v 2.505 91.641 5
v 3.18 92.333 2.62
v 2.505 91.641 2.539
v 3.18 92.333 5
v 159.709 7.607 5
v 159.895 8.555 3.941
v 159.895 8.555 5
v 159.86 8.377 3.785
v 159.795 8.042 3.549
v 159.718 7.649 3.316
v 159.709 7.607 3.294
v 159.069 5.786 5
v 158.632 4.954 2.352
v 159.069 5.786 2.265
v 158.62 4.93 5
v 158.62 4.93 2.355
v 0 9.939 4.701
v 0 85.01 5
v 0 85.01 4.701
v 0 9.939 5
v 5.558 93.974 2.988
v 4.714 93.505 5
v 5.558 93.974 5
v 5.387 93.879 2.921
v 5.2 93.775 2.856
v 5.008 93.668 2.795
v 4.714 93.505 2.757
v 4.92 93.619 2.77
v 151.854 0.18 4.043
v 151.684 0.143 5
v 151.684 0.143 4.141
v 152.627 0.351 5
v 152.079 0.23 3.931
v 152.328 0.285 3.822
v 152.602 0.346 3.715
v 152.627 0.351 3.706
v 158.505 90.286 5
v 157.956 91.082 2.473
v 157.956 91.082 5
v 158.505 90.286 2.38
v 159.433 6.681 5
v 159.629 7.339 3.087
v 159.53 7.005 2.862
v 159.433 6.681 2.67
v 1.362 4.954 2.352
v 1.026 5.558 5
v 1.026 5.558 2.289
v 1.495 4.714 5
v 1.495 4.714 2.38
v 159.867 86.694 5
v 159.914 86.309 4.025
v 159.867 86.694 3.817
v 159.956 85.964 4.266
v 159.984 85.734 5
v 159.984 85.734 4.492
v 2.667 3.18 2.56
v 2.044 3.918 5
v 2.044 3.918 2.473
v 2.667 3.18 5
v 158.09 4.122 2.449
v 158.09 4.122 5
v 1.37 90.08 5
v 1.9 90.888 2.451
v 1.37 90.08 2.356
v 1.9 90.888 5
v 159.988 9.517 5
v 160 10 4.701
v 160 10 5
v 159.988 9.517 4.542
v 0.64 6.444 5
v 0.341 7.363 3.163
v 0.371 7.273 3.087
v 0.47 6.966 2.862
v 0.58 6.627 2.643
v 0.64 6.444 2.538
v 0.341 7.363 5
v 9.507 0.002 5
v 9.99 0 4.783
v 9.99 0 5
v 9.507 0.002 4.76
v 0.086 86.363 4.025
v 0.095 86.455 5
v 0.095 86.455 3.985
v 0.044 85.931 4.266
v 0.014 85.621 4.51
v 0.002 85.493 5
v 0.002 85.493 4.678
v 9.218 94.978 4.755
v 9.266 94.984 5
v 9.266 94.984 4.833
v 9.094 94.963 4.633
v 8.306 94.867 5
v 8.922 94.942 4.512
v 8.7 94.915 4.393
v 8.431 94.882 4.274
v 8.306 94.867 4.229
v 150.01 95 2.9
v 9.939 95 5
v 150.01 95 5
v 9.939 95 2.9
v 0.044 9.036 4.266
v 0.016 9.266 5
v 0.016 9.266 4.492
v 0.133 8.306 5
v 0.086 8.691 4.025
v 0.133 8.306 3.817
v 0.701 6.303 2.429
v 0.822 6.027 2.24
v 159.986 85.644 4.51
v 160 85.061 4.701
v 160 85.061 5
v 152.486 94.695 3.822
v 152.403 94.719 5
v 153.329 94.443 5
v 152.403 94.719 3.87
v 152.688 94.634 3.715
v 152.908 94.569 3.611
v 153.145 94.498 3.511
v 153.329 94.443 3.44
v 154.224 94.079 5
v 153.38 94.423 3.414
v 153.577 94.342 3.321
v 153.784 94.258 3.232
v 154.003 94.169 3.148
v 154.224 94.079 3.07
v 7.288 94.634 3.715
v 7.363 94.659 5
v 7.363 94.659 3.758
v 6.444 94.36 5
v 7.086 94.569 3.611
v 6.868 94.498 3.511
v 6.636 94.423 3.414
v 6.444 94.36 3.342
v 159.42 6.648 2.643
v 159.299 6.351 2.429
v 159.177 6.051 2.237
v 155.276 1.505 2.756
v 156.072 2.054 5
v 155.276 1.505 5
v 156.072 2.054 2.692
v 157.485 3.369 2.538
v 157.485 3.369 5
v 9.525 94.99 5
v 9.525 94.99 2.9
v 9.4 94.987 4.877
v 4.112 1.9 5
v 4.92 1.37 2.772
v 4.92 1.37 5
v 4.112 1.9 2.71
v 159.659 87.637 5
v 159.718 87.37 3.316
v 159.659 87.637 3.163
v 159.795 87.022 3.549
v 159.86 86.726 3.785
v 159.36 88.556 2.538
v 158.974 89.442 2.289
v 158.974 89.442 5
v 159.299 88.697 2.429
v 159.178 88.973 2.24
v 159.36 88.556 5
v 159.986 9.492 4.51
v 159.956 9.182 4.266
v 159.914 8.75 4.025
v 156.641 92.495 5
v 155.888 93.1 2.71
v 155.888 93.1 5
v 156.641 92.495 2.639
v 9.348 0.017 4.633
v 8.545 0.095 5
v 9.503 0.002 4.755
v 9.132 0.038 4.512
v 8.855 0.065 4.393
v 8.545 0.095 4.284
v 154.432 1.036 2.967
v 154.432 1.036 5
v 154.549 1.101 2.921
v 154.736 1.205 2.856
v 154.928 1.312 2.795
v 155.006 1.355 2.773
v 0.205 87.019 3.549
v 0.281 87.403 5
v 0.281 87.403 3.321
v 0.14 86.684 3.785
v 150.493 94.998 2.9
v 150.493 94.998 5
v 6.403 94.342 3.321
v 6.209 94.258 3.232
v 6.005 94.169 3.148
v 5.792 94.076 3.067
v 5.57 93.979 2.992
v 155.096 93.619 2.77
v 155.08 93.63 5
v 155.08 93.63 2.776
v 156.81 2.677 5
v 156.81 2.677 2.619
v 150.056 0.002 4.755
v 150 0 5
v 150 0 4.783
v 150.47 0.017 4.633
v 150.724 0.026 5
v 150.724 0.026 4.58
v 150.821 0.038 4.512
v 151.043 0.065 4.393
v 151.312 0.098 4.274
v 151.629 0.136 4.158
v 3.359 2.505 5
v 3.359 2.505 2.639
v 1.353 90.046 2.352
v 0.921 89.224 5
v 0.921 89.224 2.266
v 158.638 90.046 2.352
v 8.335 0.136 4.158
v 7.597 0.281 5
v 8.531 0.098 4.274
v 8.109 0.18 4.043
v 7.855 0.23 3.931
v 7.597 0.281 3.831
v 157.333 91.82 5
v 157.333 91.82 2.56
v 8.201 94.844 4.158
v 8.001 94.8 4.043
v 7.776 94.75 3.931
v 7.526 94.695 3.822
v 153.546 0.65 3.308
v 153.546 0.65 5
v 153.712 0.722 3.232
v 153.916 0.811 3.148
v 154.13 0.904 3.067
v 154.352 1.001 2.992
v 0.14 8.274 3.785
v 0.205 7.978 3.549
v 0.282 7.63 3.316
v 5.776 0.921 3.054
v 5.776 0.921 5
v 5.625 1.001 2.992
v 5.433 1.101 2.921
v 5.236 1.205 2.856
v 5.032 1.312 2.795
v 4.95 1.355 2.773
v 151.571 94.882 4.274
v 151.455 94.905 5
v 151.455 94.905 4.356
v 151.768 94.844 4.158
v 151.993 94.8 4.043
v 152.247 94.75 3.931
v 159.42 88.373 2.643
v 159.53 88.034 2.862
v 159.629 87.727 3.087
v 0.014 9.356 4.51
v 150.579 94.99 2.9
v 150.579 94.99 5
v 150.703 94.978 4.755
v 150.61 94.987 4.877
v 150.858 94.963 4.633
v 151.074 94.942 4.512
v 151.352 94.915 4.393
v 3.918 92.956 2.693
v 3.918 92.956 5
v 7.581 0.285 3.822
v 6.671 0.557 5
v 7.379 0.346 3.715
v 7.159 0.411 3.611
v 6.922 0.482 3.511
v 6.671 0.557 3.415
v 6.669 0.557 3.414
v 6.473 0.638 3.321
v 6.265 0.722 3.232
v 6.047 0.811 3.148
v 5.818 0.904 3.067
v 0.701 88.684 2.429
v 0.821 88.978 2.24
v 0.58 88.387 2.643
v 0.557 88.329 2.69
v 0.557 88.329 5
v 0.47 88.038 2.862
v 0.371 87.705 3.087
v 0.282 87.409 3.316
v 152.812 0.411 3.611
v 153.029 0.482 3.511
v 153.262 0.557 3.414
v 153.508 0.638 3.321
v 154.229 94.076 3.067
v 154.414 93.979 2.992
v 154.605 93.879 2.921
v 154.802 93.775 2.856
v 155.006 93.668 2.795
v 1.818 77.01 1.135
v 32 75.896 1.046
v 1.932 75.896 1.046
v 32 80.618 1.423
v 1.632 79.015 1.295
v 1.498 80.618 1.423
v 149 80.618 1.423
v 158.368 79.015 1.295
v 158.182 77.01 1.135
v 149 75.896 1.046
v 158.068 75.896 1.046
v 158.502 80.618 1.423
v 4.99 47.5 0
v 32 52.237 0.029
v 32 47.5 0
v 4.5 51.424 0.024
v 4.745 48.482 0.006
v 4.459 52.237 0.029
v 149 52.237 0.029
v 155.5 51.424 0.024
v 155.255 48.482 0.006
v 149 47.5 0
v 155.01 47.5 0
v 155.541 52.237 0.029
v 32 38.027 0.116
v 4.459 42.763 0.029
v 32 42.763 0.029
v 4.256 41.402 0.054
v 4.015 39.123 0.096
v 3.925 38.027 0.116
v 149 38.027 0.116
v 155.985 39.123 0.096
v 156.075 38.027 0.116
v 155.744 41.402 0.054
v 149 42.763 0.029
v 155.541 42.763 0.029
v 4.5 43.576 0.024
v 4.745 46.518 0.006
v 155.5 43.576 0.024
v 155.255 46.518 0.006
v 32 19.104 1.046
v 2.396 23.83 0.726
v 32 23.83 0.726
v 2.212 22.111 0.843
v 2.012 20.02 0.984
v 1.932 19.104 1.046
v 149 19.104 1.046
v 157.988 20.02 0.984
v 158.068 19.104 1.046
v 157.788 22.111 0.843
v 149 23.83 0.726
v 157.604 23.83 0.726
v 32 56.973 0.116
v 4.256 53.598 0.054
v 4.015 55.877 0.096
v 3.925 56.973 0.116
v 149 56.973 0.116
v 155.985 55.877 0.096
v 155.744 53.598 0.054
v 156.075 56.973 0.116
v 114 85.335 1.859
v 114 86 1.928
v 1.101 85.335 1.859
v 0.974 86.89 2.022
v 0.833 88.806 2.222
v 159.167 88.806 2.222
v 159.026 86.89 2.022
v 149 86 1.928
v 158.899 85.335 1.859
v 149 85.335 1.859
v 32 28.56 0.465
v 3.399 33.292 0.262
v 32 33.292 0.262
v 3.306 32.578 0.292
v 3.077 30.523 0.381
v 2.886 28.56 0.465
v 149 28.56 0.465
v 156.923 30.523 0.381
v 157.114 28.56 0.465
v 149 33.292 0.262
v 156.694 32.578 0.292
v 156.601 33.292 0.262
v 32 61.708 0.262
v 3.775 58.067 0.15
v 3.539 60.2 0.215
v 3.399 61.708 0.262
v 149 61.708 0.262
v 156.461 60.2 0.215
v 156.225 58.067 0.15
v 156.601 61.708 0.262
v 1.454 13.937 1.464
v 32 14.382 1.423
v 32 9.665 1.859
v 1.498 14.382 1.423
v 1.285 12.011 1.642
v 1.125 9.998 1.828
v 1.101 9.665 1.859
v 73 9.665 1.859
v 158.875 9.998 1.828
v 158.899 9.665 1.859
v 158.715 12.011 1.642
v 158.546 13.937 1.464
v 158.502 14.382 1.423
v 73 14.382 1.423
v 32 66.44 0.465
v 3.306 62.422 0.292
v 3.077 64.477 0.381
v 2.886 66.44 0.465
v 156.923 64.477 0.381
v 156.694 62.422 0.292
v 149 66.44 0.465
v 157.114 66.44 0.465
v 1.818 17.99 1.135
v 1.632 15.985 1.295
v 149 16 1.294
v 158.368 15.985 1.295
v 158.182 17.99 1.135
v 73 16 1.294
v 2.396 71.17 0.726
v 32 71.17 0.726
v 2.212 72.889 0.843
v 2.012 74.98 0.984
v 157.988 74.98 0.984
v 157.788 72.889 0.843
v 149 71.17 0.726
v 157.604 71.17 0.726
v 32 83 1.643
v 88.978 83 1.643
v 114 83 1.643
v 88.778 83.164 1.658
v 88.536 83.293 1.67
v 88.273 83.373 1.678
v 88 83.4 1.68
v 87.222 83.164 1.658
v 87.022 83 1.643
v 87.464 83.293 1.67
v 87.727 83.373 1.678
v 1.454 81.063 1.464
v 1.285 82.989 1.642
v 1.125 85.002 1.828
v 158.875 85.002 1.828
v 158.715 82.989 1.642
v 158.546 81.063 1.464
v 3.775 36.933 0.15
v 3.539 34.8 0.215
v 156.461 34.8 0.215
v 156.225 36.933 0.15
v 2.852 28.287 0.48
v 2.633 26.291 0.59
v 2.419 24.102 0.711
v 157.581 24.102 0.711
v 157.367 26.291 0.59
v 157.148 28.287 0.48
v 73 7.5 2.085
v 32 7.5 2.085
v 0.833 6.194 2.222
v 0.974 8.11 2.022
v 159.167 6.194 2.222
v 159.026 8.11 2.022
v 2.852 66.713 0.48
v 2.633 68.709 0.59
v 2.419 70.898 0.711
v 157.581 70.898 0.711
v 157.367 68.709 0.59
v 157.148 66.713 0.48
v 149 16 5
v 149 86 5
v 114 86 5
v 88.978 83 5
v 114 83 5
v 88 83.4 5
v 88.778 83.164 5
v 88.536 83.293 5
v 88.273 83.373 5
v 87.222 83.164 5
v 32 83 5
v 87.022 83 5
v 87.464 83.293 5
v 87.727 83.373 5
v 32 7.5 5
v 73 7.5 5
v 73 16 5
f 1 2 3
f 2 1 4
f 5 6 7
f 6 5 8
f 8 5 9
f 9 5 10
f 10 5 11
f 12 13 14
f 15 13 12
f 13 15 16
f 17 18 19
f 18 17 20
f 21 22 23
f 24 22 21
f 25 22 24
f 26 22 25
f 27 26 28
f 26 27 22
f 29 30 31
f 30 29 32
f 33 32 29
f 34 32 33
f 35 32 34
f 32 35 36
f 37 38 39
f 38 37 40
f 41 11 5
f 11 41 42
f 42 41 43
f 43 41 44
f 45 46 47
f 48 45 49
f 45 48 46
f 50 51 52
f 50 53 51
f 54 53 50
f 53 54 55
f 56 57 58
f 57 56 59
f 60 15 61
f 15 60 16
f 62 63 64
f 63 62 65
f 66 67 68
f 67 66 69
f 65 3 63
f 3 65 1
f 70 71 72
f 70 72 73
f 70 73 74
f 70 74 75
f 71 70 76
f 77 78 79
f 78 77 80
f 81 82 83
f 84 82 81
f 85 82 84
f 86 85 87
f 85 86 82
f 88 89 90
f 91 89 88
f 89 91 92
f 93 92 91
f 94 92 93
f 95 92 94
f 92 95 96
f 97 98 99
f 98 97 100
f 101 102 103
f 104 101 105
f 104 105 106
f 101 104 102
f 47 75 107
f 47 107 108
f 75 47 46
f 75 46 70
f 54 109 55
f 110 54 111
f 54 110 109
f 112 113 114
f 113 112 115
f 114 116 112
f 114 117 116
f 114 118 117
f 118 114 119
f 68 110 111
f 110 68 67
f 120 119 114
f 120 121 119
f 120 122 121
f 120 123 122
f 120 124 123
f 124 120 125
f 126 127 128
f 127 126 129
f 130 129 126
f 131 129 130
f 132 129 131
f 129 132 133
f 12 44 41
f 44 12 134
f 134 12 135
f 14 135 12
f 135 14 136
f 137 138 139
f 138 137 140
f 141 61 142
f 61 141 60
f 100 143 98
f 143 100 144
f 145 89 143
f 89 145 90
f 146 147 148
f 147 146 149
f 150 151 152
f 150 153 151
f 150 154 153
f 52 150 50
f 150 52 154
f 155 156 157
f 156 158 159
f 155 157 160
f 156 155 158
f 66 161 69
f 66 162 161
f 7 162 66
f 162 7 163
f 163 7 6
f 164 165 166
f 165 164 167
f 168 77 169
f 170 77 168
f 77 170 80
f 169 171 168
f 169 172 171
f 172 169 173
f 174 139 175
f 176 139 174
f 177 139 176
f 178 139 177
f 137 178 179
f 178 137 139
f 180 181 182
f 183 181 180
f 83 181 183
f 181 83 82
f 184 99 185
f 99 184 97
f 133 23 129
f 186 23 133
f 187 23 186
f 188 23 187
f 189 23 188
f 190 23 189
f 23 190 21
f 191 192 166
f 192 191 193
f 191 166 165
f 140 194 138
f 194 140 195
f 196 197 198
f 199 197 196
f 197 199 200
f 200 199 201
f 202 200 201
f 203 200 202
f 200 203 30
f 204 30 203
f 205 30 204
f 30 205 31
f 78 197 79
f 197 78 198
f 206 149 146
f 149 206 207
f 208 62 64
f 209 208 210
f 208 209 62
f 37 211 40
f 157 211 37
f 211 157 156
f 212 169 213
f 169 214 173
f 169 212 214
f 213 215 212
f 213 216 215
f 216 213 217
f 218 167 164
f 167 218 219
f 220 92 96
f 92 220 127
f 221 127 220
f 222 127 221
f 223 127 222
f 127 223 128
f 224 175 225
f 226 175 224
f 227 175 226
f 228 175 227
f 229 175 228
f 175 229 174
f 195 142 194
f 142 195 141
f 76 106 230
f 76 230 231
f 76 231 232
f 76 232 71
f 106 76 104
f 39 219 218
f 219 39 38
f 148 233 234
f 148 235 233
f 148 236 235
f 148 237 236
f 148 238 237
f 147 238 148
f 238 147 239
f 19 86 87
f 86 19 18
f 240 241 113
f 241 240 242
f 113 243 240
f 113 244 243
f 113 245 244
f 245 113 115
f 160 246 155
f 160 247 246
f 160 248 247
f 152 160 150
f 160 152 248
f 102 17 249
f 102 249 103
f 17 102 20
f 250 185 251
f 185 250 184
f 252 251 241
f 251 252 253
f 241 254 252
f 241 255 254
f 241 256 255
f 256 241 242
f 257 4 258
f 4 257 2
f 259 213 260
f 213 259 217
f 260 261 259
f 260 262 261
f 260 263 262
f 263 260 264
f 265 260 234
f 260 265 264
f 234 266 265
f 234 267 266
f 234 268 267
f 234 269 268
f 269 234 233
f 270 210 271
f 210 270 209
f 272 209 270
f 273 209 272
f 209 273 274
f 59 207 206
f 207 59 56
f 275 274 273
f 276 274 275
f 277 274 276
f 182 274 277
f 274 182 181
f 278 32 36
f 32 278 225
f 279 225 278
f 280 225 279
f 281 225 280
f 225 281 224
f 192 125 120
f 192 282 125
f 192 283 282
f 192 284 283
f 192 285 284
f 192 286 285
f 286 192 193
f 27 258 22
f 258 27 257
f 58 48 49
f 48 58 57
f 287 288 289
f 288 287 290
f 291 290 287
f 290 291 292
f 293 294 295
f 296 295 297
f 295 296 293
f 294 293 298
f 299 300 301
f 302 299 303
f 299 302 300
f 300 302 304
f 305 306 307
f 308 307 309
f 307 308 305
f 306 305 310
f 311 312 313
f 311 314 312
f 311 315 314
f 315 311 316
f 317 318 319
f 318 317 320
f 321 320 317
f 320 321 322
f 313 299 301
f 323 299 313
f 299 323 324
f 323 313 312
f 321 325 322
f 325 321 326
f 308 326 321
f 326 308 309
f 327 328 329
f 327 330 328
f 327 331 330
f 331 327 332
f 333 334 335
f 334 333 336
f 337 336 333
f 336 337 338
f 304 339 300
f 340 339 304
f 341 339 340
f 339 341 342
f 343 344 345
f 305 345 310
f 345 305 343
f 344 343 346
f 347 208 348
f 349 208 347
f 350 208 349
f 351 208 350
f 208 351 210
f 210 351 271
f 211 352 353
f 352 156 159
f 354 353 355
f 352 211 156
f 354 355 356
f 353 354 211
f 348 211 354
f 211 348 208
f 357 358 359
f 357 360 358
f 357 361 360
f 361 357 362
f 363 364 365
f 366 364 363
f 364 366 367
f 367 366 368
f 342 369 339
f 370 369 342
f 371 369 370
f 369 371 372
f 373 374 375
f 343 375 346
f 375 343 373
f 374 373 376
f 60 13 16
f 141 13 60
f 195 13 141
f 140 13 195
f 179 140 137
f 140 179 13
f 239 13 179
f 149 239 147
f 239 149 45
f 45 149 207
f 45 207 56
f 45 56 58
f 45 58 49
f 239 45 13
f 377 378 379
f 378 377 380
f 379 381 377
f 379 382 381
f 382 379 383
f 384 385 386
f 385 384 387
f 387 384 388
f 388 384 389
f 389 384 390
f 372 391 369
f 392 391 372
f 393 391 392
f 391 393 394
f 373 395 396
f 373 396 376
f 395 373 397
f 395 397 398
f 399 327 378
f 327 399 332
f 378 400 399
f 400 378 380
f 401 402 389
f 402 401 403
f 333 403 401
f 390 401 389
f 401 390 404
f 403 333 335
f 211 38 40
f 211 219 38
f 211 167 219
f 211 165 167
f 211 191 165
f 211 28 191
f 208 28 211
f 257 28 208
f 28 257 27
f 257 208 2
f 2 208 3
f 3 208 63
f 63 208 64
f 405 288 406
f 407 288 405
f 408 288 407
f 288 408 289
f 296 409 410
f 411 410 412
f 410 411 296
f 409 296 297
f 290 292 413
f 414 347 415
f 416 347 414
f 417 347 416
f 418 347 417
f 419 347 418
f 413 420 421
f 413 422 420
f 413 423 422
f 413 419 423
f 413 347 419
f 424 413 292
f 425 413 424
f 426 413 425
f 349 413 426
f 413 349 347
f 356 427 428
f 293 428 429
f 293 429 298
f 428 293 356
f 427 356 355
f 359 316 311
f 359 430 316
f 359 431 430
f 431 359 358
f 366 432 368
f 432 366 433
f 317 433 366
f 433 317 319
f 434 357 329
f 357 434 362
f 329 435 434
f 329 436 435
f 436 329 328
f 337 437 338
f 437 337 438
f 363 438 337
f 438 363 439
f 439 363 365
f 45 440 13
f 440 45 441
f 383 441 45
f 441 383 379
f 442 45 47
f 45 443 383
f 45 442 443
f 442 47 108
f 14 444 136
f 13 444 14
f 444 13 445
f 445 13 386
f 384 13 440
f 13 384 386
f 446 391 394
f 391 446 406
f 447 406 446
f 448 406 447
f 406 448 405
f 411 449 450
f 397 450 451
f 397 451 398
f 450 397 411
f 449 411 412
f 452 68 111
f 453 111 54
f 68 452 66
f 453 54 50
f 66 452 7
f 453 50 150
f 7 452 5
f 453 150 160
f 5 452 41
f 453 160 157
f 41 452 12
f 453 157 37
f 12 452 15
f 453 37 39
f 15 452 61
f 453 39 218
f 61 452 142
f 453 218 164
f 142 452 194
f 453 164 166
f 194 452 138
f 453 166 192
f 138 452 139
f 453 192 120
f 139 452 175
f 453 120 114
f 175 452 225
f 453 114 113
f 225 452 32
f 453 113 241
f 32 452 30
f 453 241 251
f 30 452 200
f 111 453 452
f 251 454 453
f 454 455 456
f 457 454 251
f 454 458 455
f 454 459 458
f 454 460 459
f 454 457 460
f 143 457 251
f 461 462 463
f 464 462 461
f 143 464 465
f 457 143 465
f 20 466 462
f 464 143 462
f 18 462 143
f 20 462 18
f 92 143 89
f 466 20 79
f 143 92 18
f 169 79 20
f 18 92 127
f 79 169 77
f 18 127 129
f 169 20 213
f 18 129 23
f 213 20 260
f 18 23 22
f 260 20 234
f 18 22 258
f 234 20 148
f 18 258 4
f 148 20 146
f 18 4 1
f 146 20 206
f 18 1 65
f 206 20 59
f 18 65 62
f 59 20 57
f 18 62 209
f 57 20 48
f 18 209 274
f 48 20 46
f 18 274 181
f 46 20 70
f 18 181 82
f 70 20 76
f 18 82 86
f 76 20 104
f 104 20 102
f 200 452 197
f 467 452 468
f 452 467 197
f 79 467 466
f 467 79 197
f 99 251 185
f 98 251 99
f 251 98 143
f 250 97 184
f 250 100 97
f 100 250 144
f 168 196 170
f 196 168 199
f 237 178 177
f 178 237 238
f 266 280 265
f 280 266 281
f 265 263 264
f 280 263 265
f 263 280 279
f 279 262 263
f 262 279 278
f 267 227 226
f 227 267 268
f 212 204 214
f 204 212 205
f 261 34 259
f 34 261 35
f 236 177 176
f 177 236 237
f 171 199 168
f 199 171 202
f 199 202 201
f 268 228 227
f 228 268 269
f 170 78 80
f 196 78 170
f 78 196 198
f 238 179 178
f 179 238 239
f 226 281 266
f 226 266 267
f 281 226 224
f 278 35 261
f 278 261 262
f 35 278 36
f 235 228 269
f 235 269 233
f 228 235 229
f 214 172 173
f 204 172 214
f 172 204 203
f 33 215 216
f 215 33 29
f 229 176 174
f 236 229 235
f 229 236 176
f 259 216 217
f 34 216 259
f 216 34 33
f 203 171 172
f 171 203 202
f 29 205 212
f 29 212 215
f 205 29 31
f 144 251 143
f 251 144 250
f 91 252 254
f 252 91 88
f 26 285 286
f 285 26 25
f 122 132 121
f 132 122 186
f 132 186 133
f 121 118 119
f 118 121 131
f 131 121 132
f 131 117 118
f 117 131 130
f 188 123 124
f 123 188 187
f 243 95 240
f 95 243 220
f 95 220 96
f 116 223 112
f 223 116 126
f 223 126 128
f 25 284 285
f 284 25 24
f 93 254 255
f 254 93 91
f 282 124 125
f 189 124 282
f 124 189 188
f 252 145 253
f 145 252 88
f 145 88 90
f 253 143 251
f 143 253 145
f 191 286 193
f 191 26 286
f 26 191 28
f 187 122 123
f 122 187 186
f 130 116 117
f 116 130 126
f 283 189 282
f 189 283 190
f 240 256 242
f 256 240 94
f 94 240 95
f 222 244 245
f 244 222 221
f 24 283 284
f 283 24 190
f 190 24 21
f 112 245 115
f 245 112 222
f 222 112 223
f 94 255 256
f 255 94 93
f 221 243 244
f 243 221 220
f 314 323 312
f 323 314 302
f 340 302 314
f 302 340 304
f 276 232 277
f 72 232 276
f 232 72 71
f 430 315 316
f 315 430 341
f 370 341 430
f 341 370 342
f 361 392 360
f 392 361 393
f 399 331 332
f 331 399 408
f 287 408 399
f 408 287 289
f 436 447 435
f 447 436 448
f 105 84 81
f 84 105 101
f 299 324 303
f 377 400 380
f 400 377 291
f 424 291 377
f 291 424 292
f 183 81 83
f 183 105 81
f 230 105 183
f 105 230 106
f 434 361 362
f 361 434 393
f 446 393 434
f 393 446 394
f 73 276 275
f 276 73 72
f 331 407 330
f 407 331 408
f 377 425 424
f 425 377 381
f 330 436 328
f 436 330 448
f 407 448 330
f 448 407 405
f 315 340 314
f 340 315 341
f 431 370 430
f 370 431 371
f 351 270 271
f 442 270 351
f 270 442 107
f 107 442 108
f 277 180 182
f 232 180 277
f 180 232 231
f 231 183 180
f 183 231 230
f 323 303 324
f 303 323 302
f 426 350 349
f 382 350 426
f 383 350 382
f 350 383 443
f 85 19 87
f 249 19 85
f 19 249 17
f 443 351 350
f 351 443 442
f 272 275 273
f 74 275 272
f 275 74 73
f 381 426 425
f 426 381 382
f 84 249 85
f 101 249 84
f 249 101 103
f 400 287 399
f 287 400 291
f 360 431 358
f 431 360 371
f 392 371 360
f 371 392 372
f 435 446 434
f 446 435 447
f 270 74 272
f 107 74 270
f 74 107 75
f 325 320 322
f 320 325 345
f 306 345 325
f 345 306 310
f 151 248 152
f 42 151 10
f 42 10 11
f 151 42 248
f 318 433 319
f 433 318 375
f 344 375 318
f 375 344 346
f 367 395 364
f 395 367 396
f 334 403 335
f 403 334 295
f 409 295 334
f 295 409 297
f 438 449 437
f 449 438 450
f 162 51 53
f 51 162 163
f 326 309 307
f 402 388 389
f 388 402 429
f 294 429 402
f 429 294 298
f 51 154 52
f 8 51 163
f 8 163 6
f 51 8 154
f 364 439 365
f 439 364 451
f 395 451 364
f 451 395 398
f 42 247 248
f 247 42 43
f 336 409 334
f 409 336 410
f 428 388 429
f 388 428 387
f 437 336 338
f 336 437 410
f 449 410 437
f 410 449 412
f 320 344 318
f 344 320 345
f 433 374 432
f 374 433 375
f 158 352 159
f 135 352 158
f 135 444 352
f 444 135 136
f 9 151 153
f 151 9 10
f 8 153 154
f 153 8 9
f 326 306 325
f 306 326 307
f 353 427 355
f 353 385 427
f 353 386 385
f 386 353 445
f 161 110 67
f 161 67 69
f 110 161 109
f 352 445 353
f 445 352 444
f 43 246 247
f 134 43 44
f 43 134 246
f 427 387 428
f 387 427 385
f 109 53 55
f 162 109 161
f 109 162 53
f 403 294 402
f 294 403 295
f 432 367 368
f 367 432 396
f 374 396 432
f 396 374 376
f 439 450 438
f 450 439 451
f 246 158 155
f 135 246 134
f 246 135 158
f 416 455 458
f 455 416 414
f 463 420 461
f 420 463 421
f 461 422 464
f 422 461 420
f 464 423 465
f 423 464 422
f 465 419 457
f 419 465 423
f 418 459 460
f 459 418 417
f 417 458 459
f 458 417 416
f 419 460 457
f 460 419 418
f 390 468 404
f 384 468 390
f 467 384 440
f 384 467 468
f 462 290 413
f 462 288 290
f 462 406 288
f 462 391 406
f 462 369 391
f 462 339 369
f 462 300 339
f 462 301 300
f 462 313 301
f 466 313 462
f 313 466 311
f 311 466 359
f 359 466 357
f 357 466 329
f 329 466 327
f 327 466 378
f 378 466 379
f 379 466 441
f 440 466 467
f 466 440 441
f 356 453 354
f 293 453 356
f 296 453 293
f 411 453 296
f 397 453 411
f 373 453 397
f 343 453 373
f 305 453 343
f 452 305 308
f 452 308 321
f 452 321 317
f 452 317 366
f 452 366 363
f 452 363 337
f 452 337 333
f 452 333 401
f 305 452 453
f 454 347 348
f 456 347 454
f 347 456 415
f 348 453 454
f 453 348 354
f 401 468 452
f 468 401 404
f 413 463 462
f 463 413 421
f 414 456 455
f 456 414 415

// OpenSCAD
controllerHolder();

module controllerHolder() {

    width = 160; // +2
    depth = 95;  // -1
    height = 2;
    curvature_height = 3;
    radius_t = 10;
    radius_b = 10;
    
    draw_pcb = true;
    
    pcb_offset = [55, 17, 5];
    
    translate(pcb_offset) {
        if (draw_pcb) {
        color([0.7, 0.7, 0.7]) translate([0, 0, 3]) import(file = "controller4.dxf");
        }
    }

    difference() {
        translate([width, 0, height+curvature_height]) rotate([0, 180, 0]) baseplate(5, 10);
        
        translate(pcb_offset) {
            translate([0,   53.3, -10]) pug();
            translate([33,  65,   -10]) pug();
            translate([33,  10,   -10]) pug();
            translate([66,  3.5,  -10]) pug();
            translate([89,  3.5,  -10]) pug();
            translate([66,  61.5, -10]) pug();
            translate([89,  61.5, -10]) pug();
        }
        
        // viewfinder cutout
        translate([32, 7.5, -1]) cube([41, 25, 10]);
    
        // pi cutout
        translate([114, 16, -1]) cube([35, 70, 10]); 
        
        // board cutout
        translate([72, 16, -1]) cube([43, 67, 10]); 
        translate([32, 32, -1]) cube([41, 51, 10]); 
   
    }
    
                    

    // modules                
    
    module baseplate(rounding_diameter, rounding_diameter2) {       
        difference() {
            union() {
                xy_off = 0;
                
                intersection() {
                    diameter = 772;
                    offset = -diameter/2 + height + curvature_height;
                      
                    
                    translate([xy_off/2, xy_off/2, height]) 
                        block([width-0, depth-0, 0.1], [width-xy_off, depth-xy_off, 0.1], curvature_height);
                    
                    translate([0, depth/2, offset]) rotate([0, 90, 0]) {
                        cylinder(h=width, d=diameter, $fn=512);
                    }
                }   
                
               
                
                block([width-xy_off, depth-xy_off, 0.1], [width, depth, 0.1], height);
            }
        
            translate([-0.01, -0.01, 0]) difference() {
                cube([width+0.02, rounding_diameter/2, rounding_diameter/2]);
                translate([0, rounding_diameter/2, 0]) rotate([0, 90, 0]) cylinder(h=width, d=rounding_diameter, $fn=128);
            }
            translate([width-0.01, depth-0.01, 0]) rotate([180, 180, 0]) difference() {
                cube([width+0.02, rounding_diameter/2, rounding_diameter/2]);
                translate([0, rounding_diameter/2, 0]) rotate([0, 90, 0]) cylinder(h=width, d=rounding_diameter, $fn=128);
            }
            translate([width+0.01, 0.01, 0]) rotate([0, 0, 90]) difference() {
                cube([depth+0.02, rounding_diameter2/2, rounding_diameter2/2]);
                translate([0, rounding_diameter2/2, 0]) rotate([0, 90, 0]) cylinder(h=width, d=rounding_diameter2, $fn=128);
            }
            translate([-0.01, depth-0.01, 0]) rotate([0, 0, 270]) difference() {
                cube([depth+0.02, rounding_diameter2/2, rounding_diameter2/2]);
                translate([0, rounding_diameter2/2, 0]) rotate([0, 90, 0]) cylinder(h=width, d=rounding_diameter2, $fn=128);
            }
        }          
    }

    module pug() {
        cylinder(h=20, d=2.8, $fn=32);
    }

    module cornercutter_vert(r, h) {    
        translate([0, 0, -0.01]) {
            difference() {
            cube([r, r, h+1]);
            translate([r, r, 0])
                cylinder(h=h+1, r=r, $fn=65);
            }
        }    
    }

    module block(top, bottom, h) {    
        hull() {
            translate([ (top[0]-bottom[0])/2, 
                        (top[1]-bottom[1])/2, 
                        0]) {
                
                difference() {
                    cube(bottom);
                    
                    translate([0, 0, 0]) rotate([0, 0, 0]) cornercutter_vert(radius_b, 1);
                    translate([bottom[0]+0.01, -0.01, 0]) rotate([0, 0, 90]) cornercutter_vert(radius_b, 1);
                    translate([bottom[0]+0.01, bottom[1]+0.01, 0]) rotate([0, 0, 180]) cornercutter_vert(radius_b, 1);
                    translate([-0.01, bottom[1]+0.01, 0]) rotate([0, 0, 270]) cornercutter_vert(radius_b, 1);
                }
            }
            translate([0, 0, h]) {
                difference() {
                    cube(top);
                    
                    translate([0, 0, 0]) rotate([0, 0, 0]) cornercutter_vert(radius_t, 1);
                    translate([top[0]+0.01, -0.01, 0]) rotate([0, 0, 90]) cornercutter_vert(radius_t, 1);
                    translate([top[0]+0.01, top[1]+0.01, 0]) rotate([0, 0, 180]) cornercutter_vert(radius_t, 1);
                    translate([-0.01, top[1]+0.01, 0]) rotate([0, 0, 270]) cornercutter_vert(radius_t, 1);
                }
            }
        }
    }
}
